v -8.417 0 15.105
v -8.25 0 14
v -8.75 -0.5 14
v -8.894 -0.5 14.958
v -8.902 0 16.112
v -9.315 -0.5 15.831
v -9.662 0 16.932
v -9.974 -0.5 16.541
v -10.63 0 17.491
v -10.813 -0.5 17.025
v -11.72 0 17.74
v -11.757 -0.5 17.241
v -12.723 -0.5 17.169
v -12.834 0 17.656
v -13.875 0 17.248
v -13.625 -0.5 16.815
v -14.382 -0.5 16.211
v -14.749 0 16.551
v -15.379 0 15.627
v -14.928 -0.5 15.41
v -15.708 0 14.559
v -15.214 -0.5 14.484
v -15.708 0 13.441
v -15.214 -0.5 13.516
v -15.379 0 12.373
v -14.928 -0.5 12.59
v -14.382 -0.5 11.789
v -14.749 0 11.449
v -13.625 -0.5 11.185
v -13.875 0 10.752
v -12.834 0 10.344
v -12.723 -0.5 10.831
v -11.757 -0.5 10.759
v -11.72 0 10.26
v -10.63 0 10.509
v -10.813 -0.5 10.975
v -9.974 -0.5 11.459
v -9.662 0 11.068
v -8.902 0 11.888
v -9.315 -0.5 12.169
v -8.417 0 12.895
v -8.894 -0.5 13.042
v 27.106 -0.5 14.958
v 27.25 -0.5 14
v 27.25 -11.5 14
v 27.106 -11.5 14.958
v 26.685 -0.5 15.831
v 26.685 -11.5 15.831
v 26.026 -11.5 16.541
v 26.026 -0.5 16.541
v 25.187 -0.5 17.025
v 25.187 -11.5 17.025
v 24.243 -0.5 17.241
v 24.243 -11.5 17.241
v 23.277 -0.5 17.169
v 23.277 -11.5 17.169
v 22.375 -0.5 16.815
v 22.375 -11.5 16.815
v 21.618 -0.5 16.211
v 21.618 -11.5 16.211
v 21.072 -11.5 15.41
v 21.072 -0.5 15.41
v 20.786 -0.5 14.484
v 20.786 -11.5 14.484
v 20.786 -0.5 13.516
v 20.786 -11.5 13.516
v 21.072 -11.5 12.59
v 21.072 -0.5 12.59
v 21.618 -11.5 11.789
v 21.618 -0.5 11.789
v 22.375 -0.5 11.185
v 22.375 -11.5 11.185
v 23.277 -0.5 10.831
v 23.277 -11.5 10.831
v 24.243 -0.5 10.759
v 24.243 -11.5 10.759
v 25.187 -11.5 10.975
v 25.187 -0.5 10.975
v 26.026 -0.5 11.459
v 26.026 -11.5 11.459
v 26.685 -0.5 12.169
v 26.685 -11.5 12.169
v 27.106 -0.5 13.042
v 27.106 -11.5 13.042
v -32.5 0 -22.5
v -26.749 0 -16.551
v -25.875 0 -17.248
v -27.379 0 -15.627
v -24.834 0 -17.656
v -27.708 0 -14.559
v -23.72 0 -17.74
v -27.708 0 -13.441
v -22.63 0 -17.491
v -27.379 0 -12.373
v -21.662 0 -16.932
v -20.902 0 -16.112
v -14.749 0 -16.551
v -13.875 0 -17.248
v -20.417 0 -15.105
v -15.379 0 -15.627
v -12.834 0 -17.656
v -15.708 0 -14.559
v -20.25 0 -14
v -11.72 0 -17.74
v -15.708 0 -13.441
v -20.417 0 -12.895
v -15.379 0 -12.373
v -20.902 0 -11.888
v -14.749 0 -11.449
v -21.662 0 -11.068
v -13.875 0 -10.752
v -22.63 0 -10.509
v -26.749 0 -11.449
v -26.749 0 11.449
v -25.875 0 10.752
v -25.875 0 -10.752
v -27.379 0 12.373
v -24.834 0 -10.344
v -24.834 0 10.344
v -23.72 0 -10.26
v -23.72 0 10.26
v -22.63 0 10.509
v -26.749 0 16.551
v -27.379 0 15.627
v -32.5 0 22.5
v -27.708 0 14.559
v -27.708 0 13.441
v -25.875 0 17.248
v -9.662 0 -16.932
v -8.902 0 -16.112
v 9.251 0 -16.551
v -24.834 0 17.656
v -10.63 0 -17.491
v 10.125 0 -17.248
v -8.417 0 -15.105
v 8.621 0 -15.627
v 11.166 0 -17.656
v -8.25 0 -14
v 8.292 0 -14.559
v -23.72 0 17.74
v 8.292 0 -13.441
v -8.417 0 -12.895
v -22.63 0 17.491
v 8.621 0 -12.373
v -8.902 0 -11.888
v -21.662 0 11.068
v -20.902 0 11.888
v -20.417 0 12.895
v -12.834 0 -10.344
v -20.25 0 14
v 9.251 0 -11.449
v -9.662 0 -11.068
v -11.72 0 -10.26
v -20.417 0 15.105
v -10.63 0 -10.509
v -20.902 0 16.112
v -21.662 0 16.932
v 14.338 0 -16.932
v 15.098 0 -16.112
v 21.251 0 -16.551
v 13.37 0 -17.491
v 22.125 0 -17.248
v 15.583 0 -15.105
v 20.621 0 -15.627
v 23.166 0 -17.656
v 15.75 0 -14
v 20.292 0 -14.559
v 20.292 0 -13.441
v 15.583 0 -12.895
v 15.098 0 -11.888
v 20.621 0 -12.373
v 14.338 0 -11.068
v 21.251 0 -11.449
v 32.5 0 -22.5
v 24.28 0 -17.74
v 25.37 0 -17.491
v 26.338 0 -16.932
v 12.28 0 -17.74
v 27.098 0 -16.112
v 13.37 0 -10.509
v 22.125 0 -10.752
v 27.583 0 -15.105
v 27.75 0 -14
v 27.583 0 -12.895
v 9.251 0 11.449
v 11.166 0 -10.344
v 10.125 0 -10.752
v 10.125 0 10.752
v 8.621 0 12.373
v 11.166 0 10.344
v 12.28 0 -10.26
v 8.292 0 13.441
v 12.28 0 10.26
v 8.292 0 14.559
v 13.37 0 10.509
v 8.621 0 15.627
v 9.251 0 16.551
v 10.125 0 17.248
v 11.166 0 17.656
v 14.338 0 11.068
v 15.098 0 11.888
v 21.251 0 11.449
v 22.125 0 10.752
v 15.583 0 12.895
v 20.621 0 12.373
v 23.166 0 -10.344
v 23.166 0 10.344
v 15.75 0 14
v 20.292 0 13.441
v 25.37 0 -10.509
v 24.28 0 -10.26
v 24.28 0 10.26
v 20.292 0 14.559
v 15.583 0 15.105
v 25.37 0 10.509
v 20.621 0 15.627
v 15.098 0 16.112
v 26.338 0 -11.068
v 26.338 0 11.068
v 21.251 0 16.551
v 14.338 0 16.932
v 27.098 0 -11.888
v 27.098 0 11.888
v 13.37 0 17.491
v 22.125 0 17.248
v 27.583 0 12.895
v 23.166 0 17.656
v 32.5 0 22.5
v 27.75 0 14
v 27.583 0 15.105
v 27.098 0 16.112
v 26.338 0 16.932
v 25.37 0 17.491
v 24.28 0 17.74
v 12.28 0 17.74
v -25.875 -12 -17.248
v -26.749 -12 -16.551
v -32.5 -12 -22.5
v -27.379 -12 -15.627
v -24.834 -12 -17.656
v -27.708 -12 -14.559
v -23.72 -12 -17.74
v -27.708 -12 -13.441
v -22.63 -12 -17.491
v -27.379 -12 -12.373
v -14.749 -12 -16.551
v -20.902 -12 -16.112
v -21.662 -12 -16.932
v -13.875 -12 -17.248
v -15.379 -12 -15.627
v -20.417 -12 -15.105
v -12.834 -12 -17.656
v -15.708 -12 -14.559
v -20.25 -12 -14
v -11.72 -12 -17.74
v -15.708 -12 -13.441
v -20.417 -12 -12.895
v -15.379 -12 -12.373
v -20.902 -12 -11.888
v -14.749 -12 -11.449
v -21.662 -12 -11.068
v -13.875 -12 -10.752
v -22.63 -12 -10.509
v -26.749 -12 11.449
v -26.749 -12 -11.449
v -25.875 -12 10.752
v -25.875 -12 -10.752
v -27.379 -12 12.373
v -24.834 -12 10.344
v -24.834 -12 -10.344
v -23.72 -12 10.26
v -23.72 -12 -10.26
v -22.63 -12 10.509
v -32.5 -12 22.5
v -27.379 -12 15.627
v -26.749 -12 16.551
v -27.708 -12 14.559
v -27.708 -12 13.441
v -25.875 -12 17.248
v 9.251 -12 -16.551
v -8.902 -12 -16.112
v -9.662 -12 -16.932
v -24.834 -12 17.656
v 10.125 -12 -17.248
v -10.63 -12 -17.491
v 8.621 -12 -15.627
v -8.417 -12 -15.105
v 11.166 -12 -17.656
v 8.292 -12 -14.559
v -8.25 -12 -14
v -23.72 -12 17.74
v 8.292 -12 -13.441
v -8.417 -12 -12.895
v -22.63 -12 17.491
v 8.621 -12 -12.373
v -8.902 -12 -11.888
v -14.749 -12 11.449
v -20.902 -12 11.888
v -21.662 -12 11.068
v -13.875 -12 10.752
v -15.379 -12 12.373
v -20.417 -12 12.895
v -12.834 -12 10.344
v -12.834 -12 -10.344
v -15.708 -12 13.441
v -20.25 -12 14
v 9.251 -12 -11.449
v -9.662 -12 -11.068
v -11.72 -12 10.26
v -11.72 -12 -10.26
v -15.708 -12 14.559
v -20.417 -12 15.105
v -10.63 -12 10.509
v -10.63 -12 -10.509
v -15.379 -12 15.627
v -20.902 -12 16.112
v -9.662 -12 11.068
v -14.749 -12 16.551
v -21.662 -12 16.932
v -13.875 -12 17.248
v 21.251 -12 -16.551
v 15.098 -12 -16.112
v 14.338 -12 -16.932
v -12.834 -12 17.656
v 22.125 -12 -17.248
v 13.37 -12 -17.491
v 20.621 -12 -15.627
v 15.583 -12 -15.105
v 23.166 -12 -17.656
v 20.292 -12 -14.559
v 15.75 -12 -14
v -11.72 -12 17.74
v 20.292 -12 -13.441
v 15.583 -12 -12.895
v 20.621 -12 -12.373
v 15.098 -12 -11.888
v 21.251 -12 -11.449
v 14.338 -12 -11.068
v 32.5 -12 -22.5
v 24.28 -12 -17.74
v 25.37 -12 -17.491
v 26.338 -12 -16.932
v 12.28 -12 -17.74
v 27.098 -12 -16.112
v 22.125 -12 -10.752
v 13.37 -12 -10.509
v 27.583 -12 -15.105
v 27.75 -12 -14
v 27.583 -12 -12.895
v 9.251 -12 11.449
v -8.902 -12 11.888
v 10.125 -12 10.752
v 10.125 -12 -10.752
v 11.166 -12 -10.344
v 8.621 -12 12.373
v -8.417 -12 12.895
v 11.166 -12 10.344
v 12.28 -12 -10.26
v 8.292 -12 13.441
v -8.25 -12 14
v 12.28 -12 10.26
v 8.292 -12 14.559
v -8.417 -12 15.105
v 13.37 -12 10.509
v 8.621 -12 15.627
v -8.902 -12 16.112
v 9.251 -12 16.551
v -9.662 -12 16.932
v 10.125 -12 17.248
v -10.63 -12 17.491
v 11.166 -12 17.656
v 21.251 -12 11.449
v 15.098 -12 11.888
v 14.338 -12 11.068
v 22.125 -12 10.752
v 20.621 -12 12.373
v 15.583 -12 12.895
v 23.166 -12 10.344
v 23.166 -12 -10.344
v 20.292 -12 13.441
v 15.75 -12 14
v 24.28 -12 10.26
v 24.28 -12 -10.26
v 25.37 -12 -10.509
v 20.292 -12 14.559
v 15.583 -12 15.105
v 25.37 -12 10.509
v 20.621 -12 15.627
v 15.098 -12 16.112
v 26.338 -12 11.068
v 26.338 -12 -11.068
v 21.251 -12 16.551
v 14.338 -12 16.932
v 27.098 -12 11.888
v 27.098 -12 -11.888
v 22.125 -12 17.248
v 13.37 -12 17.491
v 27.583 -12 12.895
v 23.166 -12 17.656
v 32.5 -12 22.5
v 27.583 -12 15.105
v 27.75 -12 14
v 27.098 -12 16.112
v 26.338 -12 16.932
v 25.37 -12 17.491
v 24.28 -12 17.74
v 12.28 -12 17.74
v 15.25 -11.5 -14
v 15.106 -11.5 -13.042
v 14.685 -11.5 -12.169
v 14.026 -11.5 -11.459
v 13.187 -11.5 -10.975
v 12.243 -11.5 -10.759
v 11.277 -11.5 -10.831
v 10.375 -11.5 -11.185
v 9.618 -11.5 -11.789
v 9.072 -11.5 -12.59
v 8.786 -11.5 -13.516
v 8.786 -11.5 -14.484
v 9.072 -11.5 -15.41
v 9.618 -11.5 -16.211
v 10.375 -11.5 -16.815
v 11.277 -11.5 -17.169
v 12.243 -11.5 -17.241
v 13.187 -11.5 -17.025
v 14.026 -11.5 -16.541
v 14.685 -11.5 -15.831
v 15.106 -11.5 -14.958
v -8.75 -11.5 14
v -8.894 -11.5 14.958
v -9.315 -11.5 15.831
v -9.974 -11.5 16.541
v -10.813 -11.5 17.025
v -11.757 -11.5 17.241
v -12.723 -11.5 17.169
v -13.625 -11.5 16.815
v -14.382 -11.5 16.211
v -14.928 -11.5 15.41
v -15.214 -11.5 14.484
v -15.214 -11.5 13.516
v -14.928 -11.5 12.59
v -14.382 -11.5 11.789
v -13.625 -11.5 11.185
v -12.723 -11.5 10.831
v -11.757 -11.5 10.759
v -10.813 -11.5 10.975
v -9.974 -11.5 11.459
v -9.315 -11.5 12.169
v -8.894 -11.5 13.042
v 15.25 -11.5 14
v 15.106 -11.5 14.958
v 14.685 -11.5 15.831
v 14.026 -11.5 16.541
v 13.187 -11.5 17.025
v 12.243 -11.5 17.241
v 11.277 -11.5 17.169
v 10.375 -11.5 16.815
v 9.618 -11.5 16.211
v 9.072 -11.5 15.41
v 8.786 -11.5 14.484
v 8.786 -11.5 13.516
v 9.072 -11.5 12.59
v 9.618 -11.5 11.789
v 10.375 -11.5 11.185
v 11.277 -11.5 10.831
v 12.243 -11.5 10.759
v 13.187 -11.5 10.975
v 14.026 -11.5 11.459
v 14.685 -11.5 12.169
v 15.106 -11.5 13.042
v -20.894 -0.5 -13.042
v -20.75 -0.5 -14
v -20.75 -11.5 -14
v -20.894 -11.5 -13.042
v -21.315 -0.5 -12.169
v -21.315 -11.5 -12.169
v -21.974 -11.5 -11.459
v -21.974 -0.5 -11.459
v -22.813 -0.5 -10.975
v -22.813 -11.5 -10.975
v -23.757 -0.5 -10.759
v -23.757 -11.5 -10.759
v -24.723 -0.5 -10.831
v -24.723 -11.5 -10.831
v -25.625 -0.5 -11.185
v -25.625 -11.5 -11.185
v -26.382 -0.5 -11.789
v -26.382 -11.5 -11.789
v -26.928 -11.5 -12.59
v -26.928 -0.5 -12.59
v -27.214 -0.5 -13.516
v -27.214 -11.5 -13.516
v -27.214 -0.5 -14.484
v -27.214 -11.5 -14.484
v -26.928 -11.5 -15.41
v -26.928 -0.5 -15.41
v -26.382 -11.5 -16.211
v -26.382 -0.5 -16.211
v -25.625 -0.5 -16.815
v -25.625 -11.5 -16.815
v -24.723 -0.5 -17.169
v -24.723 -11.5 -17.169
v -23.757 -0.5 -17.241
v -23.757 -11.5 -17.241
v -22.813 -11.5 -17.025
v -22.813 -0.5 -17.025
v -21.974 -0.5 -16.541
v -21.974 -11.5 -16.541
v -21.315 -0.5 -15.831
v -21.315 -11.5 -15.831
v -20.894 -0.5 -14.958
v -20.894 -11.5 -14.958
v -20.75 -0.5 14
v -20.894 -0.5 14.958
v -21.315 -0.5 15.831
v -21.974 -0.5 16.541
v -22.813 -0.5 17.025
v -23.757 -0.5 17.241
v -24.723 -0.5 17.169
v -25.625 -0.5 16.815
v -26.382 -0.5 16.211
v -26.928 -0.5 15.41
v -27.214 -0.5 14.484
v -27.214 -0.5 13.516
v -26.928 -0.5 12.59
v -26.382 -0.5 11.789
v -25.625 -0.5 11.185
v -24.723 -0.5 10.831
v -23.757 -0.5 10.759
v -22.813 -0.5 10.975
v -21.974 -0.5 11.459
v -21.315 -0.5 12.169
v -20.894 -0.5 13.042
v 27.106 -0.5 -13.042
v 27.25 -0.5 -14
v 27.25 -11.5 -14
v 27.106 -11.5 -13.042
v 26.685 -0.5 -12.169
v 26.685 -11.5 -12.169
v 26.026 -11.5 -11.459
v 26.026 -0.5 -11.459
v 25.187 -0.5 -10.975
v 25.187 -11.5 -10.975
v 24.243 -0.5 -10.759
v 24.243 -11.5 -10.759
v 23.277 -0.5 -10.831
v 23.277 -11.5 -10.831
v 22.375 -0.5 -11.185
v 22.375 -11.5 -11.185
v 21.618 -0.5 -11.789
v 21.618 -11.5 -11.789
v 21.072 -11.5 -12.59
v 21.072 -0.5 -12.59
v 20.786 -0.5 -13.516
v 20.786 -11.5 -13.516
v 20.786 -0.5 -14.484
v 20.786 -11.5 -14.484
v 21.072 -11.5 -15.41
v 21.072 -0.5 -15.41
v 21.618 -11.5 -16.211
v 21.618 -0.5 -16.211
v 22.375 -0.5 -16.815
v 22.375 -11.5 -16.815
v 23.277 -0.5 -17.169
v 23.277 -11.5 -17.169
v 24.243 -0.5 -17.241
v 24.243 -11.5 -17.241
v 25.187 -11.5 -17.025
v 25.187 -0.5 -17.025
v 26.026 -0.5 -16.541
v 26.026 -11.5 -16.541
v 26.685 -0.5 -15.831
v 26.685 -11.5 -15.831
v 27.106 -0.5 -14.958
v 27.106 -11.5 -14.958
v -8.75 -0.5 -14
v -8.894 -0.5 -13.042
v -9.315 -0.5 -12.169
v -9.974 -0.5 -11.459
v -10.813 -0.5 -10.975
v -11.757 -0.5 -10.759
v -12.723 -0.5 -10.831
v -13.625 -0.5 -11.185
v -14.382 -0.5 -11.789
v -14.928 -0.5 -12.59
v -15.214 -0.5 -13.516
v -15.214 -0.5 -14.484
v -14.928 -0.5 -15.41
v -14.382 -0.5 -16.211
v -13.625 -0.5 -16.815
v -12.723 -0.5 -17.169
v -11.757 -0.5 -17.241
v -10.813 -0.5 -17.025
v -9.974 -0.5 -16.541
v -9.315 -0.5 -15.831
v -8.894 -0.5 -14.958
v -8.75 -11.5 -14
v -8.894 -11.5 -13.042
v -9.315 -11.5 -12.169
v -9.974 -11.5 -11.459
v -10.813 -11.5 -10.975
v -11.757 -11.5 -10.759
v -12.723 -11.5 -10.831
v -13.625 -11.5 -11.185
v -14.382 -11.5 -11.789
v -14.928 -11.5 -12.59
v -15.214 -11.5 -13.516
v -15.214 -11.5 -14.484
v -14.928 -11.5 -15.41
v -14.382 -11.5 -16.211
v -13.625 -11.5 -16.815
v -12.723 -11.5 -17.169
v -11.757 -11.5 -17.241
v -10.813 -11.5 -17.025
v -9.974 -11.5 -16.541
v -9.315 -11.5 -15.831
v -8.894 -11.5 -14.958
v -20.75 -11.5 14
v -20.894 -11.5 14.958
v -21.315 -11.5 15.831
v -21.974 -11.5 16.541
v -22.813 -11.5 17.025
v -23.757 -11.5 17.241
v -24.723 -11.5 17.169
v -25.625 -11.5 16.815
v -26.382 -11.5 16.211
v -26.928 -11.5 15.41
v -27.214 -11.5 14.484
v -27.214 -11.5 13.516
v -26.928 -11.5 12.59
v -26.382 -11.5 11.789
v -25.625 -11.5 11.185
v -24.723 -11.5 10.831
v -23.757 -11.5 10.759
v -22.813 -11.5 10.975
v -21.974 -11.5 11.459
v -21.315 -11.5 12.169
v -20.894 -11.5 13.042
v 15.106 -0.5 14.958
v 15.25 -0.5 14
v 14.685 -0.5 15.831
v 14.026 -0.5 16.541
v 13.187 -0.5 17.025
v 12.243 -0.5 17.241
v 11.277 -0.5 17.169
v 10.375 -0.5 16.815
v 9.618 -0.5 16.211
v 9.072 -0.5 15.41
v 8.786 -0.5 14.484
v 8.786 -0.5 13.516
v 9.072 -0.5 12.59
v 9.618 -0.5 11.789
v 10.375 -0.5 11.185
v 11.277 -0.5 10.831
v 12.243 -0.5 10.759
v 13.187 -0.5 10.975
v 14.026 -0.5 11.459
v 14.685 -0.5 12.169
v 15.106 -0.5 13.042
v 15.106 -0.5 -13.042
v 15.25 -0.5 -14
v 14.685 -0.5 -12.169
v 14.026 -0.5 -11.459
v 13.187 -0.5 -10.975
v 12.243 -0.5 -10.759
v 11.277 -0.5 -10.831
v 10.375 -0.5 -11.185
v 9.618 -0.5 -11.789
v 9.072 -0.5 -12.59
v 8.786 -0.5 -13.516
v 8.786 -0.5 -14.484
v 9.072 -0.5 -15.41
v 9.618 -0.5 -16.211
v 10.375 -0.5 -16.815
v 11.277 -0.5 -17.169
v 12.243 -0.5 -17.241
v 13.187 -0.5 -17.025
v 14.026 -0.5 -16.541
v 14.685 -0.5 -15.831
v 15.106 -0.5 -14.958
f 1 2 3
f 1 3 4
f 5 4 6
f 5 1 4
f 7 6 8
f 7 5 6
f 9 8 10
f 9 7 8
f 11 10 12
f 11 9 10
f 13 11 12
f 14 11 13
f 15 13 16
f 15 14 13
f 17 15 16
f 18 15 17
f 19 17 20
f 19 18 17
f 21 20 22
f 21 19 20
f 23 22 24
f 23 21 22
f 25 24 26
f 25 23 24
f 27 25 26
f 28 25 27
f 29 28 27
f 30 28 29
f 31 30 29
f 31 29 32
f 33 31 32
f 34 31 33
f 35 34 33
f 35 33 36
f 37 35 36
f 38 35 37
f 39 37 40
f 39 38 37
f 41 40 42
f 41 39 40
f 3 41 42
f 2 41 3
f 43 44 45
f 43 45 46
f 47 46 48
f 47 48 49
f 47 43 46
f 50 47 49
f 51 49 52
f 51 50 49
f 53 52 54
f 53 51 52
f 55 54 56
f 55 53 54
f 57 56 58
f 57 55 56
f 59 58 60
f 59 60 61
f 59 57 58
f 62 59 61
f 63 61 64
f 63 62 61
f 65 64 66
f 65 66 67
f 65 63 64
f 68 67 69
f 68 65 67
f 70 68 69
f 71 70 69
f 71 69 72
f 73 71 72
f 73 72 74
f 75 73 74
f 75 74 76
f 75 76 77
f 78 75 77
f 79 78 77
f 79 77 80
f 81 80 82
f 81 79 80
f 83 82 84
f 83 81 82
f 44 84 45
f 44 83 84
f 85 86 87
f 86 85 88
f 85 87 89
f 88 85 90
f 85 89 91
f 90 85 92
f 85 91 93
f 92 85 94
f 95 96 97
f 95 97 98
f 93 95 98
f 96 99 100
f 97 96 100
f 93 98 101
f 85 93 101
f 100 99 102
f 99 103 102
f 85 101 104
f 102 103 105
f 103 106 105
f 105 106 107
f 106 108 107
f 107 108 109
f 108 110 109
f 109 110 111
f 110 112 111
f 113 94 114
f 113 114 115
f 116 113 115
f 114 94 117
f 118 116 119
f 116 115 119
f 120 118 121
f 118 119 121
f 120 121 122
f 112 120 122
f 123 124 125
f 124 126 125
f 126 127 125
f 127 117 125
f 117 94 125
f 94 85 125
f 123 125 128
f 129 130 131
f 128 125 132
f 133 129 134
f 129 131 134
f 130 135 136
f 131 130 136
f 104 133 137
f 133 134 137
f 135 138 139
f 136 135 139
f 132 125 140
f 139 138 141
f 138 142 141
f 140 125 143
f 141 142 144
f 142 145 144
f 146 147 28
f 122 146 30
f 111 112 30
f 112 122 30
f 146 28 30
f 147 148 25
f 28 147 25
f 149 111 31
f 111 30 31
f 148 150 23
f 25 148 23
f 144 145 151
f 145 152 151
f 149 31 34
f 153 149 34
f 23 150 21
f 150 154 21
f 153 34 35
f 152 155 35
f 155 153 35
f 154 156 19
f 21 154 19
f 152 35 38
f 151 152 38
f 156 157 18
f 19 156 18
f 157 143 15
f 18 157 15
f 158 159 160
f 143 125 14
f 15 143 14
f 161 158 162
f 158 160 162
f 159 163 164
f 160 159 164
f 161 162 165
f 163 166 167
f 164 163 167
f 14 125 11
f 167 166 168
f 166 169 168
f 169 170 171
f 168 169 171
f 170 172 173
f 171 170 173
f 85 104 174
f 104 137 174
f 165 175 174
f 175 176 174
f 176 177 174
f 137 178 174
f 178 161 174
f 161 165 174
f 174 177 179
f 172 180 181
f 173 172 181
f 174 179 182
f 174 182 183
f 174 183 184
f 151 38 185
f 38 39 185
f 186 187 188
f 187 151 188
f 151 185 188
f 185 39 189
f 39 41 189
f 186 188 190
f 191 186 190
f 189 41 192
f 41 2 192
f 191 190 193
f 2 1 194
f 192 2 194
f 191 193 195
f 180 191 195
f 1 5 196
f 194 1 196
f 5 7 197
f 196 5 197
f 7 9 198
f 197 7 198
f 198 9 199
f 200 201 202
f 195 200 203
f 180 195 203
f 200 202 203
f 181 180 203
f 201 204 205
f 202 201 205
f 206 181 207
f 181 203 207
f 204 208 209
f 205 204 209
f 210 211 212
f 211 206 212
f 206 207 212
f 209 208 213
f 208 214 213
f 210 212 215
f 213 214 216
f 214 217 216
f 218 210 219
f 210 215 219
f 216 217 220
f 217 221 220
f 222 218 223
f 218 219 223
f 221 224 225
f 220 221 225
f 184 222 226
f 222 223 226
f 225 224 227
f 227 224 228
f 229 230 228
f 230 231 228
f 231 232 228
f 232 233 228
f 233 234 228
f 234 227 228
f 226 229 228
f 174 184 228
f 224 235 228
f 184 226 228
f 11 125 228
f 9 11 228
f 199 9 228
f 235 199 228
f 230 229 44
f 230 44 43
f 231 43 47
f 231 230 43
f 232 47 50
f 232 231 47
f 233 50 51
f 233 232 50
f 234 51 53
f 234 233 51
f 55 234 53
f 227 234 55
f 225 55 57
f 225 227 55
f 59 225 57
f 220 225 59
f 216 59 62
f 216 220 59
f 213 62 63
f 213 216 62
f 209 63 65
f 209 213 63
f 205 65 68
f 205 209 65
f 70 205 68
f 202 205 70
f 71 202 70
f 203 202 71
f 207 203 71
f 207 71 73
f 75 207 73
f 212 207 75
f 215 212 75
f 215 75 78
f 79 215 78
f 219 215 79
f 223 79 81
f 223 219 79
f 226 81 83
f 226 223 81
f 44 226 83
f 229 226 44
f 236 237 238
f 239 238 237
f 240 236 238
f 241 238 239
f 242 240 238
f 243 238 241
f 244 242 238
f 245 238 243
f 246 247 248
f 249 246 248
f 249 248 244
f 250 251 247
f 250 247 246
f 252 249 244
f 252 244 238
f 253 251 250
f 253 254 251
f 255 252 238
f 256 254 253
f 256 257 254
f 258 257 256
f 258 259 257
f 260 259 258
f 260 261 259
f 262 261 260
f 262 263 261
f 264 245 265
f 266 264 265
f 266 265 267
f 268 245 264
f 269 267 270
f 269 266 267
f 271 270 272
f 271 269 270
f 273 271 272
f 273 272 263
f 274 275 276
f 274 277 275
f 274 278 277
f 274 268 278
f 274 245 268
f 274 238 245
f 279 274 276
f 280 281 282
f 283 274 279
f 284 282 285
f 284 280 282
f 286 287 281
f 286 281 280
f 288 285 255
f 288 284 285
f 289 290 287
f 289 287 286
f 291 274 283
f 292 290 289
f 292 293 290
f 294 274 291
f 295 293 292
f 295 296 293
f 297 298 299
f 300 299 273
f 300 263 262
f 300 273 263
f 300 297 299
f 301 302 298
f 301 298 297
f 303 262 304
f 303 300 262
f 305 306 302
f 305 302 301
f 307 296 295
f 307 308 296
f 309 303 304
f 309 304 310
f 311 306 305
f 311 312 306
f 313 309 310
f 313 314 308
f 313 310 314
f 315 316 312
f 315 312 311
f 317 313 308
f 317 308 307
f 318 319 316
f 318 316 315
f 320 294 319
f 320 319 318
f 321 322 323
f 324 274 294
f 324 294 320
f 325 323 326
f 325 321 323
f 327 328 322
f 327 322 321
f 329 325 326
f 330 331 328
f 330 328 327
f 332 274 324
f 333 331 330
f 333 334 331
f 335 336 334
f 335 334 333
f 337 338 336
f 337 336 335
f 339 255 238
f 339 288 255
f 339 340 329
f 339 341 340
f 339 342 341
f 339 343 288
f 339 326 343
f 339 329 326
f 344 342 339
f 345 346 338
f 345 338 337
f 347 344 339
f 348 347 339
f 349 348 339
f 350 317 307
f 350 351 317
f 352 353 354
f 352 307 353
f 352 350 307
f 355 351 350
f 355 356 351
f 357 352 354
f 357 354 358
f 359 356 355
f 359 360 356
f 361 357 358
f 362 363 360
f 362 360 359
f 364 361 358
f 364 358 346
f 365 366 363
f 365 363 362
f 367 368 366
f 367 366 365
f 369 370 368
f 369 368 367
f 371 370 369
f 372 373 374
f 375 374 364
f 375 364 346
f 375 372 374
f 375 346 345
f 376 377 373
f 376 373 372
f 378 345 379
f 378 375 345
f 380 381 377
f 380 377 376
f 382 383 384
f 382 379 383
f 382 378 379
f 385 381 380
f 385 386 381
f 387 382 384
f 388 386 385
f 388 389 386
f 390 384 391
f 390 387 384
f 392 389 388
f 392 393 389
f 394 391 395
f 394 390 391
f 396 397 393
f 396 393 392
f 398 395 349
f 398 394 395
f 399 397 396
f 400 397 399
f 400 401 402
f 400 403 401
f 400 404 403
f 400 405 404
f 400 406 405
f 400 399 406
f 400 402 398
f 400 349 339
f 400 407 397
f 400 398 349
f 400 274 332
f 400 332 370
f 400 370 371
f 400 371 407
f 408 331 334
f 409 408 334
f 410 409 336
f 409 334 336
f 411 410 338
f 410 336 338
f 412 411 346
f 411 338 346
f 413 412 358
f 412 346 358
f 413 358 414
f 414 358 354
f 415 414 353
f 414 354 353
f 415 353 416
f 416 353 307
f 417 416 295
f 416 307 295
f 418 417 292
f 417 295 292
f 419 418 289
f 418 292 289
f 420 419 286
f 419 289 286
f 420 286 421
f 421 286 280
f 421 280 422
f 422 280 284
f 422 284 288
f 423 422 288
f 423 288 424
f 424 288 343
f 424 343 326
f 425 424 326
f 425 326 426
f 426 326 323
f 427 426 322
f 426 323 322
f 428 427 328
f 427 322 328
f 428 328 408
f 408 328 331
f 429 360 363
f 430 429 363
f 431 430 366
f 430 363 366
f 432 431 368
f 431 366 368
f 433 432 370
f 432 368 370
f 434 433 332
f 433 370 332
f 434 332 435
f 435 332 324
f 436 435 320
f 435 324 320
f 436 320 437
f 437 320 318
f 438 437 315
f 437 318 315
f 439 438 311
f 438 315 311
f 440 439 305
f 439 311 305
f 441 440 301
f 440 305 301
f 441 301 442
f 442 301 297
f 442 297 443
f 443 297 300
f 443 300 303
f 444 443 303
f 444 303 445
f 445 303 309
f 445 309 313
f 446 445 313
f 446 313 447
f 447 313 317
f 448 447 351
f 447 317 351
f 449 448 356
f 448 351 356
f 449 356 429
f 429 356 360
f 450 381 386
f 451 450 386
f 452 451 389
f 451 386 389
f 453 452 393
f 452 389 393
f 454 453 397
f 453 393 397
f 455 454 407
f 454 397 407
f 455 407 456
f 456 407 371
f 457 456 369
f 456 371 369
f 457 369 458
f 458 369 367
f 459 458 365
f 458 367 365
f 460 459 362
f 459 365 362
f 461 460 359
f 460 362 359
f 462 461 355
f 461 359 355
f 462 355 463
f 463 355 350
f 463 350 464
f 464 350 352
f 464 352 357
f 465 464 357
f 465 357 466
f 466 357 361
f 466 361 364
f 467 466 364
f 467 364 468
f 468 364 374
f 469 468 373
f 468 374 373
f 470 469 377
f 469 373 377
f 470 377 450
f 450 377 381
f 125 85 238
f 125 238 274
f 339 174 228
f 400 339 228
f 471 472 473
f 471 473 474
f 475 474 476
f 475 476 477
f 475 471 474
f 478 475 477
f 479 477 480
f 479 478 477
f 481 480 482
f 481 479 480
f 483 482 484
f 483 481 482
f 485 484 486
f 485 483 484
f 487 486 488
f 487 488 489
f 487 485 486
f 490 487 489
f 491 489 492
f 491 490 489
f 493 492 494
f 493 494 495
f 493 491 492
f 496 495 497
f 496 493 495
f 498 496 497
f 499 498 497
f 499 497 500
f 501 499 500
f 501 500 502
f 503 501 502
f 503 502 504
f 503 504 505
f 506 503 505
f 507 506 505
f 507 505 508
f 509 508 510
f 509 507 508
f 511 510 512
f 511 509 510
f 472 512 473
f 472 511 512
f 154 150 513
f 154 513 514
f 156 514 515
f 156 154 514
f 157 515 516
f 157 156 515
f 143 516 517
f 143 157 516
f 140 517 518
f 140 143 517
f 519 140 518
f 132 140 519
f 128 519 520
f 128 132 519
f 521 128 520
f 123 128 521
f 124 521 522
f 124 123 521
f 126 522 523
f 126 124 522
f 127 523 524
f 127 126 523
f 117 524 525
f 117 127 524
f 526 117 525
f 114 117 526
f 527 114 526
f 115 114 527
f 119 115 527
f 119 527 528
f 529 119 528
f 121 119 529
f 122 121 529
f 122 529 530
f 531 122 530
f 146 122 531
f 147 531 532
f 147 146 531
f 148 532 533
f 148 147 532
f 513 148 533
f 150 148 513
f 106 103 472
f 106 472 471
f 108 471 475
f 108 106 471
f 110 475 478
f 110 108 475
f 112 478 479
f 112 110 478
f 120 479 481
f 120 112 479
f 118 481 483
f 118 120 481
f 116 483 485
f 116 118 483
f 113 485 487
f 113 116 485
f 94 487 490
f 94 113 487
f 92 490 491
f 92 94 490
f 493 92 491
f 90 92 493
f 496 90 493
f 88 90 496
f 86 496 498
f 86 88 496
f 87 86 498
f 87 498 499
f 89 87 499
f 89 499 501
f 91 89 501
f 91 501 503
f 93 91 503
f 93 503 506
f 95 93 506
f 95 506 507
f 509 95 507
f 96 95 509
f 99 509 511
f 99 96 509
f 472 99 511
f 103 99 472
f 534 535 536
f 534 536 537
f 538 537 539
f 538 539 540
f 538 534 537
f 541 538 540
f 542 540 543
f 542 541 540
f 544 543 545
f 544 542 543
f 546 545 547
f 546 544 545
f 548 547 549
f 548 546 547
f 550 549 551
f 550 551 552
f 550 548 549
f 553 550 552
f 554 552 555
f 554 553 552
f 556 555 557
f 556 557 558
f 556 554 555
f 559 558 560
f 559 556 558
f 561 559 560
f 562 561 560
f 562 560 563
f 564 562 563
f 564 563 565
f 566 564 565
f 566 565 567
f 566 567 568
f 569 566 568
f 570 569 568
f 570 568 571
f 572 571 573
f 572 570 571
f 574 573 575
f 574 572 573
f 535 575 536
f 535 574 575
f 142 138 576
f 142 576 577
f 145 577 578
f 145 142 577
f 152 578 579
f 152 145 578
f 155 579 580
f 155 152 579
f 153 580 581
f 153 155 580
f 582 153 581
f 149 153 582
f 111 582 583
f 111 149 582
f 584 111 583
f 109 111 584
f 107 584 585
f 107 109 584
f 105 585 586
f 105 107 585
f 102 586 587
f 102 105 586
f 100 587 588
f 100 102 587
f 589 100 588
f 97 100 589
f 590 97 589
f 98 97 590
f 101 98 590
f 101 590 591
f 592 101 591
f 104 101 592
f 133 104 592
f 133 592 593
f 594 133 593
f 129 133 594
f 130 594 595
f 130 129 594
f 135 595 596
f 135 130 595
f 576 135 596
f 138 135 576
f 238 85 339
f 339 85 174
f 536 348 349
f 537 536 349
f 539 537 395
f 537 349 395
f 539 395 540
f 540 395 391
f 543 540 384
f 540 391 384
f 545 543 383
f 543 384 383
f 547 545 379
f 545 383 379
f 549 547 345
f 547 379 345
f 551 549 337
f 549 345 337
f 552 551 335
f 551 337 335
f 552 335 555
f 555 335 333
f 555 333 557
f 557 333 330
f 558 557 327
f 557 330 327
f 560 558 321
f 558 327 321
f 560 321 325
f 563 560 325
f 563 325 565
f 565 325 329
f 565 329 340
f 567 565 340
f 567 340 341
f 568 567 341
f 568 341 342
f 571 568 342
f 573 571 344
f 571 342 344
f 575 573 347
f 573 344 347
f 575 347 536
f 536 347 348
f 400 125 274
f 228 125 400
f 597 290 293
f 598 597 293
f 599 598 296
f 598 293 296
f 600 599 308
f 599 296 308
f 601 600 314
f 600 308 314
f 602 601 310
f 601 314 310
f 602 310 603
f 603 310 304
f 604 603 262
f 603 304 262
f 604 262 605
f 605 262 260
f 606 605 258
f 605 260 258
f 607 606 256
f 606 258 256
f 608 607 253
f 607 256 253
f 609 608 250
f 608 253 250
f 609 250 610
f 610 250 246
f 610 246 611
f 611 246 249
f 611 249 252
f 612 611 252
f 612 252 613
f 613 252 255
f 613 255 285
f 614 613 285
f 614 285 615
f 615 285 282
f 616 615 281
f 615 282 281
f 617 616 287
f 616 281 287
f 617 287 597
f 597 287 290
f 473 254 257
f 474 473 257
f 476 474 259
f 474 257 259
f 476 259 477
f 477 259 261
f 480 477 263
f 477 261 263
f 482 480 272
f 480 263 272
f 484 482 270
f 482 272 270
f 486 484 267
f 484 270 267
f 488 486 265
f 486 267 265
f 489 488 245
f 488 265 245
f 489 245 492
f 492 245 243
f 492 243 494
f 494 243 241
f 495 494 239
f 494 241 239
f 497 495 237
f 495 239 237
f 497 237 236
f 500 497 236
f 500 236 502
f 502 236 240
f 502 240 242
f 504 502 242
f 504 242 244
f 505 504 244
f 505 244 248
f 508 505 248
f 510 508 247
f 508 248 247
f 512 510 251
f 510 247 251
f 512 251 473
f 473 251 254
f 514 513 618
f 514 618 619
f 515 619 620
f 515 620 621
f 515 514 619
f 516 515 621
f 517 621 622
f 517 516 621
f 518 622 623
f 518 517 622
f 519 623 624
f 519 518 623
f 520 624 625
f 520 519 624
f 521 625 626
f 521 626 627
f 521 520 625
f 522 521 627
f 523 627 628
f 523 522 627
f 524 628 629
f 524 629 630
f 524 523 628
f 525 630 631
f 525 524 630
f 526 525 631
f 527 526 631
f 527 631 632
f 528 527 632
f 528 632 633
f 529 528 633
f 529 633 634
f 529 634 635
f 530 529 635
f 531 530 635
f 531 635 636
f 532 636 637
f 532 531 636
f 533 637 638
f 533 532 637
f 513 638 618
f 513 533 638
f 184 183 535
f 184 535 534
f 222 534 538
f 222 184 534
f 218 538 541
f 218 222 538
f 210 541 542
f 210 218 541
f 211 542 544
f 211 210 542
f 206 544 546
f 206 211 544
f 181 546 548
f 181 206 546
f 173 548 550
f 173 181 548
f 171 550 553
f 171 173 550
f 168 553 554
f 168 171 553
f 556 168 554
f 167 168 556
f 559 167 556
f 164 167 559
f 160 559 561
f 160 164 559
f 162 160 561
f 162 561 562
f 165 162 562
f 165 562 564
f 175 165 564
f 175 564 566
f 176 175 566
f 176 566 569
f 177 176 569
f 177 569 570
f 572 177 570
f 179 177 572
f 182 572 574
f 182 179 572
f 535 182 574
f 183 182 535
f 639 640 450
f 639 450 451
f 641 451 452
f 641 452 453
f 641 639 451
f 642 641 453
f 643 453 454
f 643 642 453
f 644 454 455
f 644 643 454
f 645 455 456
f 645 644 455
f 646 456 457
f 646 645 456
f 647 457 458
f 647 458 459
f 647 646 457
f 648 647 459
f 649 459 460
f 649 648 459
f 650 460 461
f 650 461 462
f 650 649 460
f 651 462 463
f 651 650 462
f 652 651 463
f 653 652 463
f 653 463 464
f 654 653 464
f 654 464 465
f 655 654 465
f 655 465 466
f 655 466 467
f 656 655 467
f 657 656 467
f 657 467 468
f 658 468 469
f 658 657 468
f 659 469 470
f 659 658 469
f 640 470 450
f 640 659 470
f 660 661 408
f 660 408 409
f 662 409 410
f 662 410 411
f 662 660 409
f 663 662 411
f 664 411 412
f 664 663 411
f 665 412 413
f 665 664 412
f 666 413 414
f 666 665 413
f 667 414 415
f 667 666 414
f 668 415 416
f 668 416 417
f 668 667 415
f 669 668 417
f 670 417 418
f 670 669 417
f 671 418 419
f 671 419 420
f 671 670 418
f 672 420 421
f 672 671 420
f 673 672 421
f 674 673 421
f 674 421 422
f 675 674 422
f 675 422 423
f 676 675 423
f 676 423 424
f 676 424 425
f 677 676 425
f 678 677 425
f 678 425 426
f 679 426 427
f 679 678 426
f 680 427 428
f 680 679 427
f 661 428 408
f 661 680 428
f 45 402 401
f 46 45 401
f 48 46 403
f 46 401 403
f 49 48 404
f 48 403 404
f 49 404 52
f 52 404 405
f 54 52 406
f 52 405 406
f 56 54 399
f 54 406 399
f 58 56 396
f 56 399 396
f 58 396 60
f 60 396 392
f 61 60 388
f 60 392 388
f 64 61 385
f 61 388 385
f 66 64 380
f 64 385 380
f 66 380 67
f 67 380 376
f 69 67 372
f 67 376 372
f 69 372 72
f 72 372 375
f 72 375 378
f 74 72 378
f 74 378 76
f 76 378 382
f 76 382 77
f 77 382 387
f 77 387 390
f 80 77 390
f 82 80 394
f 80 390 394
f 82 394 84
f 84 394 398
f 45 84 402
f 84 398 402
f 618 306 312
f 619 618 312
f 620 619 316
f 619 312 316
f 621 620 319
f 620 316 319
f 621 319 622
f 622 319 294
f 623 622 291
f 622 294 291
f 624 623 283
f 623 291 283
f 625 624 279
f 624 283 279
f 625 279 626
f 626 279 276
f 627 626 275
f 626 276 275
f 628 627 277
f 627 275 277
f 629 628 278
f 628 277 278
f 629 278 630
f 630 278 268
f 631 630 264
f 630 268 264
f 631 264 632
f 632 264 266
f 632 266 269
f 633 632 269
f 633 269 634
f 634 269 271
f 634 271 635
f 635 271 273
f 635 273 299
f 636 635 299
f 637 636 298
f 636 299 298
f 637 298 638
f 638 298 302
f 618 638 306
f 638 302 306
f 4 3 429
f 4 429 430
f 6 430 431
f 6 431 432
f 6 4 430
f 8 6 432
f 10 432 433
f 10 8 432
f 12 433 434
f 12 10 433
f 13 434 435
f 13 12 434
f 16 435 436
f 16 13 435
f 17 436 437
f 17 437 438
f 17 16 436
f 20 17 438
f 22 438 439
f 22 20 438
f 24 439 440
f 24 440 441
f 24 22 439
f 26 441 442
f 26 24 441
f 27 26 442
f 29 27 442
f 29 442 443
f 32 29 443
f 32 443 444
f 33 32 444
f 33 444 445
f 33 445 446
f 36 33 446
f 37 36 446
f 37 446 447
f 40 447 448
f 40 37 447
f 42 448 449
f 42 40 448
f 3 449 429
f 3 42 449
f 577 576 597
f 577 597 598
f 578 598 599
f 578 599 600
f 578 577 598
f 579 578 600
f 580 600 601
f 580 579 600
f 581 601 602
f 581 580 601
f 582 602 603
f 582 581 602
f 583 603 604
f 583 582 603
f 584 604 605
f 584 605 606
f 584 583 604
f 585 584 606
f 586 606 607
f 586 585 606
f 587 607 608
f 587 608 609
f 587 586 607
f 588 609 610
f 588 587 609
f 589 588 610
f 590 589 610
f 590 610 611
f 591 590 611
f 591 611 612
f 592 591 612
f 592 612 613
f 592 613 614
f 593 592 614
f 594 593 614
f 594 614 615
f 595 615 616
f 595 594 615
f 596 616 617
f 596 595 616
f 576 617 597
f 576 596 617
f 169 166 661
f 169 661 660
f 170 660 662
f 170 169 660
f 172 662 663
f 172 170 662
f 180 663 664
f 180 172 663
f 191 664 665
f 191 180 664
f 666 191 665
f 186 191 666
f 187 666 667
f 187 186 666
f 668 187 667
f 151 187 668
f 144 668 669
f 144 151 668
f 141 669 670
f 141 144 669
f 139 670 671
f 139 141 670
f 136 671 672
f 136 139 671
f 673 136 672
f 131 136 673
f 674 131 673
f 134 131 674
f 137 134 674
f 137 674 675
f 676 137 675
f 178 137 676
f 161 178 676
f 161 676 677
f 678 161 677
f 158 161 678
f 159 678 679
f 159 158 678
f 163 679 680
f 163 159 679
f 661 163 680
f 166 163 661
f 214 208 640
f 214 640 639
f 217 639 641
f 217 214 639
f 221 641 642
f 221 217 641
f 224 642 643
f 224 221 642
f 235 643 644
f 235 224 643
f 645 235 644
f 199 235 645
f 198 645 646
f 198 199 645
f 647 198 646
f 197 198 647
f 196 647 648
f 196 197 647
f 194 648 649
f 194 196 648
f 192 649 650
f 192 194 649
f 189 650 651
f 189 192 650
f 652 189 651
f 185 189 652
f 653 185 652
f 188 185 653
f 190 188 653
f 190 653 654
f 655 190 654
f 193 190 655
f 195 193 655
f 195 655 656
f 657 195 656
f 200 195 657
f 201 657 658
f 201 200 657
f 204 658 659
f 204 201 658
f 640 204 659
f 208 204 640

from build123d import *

# Parameters (mm, degrees)
F0_W     = 65
F0_H     = 45
F0_R     = 3.25
F1_DEPTH = 12
F2_SIZE  = 0.5


with BuildPart() as f1:
    # F0 (on Front) → F1 (new body)
    with BuildSketch(Plane.XZ):
        Rectangle(F0_W, F0_H)
        with Locations((-24, -14)):
            Circle(F0_R, mode=Mode.SUBTRACT)
        with Locations((-12, -14)):
            Circle(F0_R, mode=Mode.SUBTRACT)
        with Locations((12, -14)):
            Circle(F0_R, mode=Mode.SUBTRACT)
        with Locations((24, -14)):
            Circle(F0_R, mode=Mode.SUBTRACT)
        with Locations((-24, 14)):
            Circle(F0_R, mode=Mode.SUBTRACT)
        with Locations((-12, 14)):
            Circle(F0_R, mode=Mode.SUBTRACT)
        with Locations((12, 14)):
            Circle(F0_R, mode=Mode.SUBTRACT)
        with Locations((24, 14)):
            Circle(F0_R, mode=Mode.SUBTRACT)
    extrude(amount=F1_DEPTH)

    # F2
    f2_edges = [f1.edges().sort_by_distance(p)[0] for p in [
        (-20.75, -6, 14),
        (-27.25, 0, 14),
        (-27.25, -12, 14),
        (-8.75, -6, 14),
        (-15.25, 0, 14),
        (-15.25, -12, 14),
        (-20.75, -6, -14),
        (-27.25, 0, -14),
        (-27.25, -12, -14),
        (-8.75, -6, -14),
        (-15.25, 0, -14),
        (-15.25, -12, -14),
        (15.25, -6, 14),
        (8.75, 0, 14),
        (8.75, -12, 14),
        (27.25, -6, 14),
        (20.75, 0, 14),
        (20.75, -12, 14),
        (27.25, -6, -14),
        (20.75, 0, -14),
        (20.75, -12, -14),
        (15.25, -6, -14),
        (8.75, 0, -14),
        (8.75, -12, -14),
    ]]
    chamfer(f2_edges, length=F2_SIZE)


solid = f1.part
